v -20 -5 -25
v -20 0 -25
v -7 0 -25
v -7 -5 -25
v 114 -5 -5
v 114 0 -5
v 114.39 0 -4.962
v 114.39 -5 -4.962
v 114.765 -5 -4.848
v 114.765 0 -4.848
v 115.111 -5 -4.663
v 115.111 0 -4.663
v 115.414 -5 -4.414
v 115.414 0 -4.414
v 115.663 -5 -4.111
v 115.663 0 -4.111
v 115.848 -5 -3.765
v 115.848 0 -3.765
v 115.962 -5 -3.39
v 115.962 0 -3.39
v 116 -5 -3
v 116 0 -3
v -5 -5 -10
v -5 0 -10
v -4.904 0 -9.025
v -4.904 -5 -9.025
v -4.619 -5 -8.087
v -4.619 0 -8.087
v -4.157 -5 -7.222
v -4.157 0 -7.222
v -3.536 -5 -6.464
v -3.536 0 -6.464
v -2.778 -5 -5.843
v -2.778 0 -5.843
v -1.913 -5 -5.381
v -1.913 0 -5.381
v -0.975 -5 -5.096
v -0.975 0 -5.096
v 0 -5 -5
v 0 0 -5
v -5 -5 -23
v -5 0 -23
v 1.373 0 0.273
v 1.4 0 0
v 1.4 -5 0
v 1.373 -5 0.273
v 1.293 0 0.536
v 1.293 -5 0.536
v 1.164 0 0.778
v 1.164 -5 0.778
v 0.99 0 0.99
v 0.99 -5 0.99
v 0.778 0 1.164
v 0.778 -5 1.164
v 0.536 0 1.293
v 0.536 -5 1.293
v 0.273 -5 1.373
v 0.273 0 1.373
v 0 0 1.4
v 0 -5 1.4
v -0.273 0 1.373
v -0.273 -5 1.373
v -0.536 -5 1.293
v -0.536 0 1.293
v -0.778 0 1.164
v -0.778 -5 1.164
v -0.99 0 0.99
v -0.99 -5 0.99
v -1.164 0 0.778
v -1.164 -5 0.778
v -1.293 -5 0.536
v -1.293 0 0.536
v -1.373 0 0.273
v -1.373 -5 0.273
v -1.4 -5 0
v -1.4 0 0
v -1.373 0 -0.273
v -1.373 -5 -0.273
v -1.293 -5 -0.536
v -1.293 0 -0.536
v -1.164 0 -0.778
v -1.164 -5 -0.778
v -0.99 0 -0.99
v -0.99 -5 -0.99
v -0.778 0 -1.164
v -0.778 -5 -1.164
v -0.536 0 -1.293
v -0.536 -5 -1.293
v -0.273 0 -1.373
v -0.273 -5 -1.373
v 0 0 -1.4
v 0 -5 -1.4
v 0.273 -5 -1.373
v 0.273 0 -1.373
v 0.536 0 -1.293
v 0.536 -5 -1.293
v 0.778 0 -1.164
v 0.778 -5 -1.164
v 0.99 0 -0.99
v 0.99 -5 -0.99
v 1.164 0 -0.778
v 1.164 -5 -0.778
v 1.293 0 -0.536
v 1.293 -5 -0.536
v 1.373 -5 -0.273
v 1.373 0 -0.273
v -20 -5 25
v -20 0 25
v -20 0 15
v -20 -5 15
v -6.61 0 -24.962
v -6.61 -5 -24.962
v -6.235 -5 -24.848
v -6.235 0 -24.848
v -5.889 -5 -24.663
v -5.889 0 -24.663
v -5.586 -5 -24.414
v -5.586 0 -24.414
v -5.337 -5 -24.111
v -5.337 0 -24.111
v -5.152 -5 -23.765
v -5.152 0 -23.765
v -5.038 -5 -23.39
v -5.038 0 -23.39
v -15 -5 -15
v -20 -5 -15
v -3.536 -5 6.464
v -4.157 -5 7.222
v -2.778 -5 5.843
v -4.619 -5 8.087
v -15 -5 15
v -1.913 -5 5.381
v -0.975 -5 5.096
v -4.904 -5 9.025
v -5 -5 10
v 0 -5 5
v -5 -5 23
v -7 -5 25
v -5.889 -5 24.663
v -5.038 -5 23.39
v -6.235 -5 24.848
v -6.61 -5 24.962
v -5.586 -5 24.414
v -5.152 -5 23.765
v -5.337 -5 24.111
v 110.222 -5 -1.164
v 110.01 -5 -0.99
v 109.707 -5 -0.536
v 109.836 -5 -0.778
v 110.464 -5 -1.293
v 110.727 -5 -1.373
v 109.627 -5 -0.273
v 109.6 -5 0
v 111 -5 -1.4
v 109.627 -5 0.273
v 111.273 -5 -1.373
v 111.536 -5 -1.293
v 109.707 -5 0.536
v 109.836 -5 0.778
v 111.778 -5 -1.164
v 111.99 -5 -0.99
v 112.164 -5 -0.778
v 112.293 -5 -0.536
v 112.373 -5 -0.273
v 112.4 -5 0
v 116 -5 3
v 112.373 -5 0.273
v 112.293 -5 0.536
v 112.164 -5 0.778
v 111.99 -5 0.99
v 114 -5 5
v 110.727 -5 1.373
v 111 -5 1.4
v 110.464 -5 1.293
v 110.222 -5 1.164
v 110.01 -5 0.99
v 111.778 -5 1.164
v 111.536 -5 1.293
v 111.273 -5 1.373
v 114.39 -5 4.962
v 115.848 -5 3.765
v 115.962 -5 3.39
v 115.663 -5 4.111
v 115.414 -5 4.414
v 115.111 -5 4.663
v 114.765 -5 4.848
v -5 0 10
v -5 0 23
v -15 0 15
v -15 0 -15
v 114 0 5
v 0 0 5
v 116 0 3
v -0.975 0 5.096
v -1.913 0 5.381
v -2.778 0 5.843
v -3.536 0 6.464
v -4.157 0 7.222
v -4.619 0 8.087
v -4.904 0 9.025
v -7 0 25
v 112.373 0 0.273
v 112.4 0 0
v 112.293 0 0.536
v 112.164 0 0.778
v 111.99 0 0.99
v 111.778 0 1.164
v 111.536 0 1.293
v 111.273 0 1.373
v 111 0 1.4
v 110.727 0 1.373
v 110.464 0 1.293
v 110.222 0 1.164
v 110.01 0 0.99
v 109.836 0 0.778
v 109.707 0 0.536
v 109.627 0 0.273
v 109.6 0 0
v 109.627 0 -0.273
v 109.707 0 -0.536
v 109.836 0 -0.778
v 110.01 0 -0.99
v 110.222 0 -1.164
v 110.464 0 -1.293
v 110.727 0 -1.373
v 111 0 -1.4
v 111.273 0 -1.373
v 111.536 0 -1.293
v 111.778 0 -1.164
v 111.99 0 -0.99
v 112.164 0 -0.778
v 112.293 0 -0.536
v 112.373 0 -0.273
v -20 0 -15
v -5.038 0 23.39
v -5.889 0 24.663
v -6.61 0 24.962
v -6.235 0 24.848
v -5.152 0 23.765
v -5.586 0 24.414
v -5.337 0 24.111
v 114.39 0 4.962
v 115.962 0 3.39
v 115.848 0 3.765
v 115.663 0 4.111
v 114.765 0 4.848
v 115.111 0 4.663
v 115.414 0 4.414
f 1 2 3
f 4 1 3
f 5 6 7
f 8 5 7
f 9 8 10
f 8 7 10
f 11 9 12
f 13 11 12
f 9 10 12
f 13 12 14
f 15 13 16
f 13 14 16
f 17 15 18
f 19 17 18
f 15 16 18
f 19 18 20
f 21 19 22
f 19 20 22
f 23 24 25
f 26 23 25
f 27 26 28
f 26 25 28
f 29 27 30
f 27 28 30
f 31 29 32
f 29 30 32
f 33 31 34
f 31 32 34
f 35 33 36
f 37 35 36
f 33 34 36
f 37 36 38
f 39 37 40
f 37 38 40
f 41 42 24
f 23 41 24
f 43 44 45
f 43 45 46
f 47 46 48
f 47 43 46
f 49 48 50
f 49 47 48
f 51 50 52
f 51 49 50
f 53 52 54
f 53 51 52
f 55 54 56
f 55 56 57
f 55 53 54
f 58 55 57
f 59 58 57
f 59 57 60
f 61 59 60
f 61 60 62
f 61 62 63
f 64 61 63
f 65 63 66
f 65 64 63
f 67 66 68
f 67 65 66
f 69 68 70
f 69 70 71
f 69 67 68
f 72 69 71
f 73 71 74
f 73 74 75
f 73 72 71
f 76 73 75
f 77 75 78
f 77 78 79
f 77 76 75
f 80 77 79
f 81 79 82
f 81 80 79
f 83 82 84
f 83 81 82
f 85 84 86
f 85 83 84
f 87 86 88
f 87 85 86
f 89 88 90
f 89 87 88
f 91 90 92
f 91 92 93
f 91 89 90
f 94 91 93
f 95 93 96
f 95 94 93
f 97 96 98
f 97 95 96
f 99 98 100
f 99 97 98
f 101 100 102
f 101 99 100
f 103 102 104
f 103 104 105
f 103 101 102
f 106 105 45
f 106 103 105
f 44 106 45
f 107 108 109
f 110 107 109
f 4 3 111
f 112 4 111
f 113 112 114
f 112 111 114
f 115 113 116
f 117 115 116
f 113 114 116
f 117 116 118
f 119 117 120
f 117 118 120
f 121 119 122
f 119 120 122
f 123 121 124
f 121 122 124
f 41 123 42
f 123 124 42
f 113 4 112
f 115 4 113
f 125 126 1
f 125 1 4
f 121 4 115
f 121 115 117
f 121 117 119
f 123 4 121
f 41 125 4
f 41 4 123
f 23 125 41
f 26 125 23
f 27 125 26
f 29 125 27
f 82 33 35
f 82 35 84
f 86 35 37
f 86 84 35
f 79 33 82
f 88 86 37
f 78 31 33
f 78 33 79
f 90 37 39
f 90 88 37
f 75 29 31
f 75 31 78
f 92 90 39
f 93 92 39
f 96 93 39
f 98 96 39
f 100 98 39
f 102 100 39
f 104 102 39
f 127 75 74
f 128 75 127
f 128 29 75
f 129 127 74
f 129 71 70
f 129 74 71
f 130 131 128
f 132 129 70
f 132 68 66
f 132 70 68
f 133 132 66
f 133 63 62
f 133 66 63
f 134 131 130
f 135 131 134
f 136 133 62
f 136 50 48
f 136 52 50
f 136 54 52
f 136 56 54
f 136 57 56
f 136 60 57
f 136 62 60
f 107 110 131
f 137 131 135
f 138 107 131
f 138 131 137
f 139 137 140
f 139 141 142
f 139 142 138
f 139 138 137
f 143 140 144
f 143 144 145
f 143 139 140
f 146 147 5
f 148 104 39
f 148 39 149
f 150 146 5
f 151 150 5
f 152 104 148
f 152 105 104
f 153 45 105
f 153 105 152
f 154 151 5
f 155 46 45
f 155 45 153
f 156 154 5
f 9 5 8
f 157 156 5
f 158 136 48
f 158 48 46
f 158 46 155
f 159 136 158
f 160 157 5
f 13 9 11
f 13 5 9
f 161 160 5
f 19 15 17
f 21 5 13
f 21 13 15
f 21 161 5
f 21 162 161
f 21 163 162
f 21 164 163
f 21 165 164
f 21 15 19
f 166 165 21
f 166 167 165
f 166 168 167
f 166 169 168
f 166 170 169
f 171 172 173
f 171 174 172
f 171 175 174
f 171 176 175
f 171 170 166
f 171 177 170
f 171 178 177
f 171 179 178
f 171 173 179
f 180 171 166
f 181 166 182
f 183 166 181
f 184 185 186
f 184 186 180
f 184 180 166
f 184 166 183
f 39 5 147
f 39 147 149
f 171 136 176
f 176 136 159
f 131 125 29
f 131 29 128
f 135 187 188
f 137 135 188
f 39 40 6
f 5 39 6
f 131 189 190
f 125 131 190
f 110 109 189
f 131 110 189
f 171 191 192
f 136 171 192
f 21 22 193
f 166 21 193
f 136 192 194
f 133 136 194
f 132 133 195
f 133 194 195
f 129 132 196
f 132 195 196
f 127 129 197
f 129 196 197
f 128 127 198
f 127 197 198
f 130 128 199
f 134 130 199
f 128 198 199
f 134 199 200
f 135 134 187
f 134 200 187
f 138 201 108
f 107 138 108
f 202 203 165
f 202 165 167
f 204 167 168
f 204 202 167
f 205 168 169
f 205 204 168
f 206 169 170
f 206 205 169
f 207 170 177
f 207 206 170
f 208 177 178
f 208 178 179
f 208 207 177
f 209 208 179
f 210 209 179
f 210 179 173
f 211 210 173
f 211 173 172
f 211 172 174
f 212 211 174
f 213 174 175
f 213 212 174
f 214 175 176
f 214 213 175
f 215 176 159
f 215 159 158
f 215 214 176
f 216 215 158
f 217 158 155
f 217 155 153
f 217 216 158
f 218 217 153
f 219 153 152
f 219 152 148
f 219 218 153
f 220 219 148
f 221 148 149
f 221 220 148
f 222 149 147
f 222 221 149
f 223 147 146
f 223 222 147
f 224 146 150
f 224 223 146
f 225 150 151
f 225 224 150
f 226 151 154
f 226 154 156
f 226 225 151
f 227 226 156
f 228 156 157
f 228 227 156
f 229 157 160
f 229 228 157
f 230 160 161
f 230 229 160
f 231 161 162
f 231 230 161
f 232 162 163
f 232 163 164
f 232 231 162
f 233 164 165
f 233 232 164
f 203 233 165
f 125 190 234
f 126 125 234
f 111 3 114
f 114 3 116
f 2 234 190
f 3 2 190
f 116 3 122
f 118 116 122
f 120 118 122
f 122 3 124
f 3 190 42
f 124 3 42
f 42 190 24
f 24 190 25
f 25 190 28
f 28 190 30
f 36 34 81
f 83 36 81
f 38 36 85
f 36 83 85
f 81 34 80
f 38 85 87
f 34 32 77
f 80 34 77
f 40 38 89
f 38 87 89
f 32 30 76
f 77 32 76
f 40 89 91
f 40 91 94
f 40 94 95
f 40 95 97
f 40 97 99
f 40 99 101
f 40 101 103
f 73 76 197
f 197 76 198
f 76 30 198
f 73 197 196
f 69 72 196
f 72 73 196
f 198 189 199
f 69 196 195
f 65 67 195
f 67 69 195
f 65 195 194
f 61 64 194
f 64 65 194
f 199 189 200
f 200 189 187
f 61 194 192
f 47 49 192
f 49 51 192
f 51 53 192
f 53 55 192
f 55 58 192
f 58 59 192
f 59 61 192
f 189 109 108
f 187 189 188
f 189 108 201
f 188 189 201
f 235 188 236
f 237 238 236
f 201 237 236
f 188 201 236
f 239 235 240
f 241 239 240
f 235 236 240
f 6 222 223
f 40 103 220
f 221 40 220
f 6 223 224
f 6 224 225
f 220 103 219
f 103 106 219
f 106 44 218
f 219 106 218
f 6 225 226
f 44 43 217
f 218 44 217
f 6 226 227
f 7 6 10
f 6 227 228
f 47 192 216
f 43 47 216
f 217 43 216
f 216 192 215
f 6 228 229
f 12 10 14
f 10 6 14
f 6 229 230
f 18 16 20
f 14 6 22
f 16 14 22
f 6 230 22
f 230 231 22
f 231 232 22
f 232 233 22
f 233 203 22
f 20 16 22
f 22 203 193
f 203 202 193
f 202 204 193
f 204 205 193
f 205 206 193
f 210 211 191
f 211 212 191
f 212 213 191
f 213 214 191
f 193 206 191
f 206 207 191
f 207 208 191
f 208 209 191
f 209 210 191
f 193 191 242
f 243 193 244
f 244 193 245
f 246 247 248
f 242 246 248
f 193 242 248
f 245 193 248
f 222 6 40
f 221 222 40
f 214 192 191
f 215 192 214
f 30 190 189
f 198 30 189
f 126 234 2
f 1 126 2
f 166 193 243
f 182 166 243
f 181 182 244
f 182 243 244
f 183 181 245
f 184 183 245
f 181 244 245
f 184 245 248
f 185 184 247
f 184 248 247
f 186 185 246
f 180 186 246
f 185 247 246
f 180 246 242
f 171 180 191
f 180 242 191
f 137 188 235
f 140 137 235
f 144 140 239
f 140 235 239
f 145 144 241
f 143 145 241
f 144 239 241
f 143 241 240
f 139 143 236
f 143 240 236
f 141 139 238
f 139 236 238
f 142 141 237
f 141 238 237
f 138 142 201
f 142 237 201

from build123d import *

# Parameters (mm, degrees)
F0_R     = 1.4
F1_DEPTH = 5


with BuildPart() as f1:
    # F0 (on Front) → F1 (new body)
    with BuildSketch(Plane.XZ):
        with BuildLine():
            ThreePointArc((-5, -10), (-3.535534, -6.464466), (0, -5))
            Line((0, -5), (114, -5))
            ThreePointArc((114, -5), (115.414214, -4.414214), (116, -3))
            Line((116, -3), (116, 3))
            ThreePointArc((116, 3), (115.414214, 4.414214), (114, 5))
            Line((114, 5), (0, 5))
            ThreePointArc((0, 5), (-3.535534, 6.464466), (-5, 10))
            Line((-5, 10), (-5, 23))
            ThreePointArc((-5, 23), (-5.585786, 24.414214), (-7, 25))
            Line((-7, 25), (-15, 25))
            Line((-15, 25), (-20, 25))
            Line((-20, 25), (-20, 15))
            Line((-20, 15), (-15, 15))
            Line((-15, 15), (-15, -15))
            Line((-15, -15), (-20, -15))
            Line((-20, -15), (-20, -25))
            Line((-20, -25), (-15, -25))
            Line((-15, -25), (-7, -25))
            ThreePointArc((-7, -25), (-5.585786, -24.414214), (-5, -23))
            Line((-5, -23), (-5, -10))
        make_face()
        Circle(F0_R, mode=Mode.SUBTRACT)
        with Locations((111, 0)):
            Circle(F0_R, mode=Mode.SUBTRACT)
    extrude(amount=F1_DEPTH)


solid = f1.part
